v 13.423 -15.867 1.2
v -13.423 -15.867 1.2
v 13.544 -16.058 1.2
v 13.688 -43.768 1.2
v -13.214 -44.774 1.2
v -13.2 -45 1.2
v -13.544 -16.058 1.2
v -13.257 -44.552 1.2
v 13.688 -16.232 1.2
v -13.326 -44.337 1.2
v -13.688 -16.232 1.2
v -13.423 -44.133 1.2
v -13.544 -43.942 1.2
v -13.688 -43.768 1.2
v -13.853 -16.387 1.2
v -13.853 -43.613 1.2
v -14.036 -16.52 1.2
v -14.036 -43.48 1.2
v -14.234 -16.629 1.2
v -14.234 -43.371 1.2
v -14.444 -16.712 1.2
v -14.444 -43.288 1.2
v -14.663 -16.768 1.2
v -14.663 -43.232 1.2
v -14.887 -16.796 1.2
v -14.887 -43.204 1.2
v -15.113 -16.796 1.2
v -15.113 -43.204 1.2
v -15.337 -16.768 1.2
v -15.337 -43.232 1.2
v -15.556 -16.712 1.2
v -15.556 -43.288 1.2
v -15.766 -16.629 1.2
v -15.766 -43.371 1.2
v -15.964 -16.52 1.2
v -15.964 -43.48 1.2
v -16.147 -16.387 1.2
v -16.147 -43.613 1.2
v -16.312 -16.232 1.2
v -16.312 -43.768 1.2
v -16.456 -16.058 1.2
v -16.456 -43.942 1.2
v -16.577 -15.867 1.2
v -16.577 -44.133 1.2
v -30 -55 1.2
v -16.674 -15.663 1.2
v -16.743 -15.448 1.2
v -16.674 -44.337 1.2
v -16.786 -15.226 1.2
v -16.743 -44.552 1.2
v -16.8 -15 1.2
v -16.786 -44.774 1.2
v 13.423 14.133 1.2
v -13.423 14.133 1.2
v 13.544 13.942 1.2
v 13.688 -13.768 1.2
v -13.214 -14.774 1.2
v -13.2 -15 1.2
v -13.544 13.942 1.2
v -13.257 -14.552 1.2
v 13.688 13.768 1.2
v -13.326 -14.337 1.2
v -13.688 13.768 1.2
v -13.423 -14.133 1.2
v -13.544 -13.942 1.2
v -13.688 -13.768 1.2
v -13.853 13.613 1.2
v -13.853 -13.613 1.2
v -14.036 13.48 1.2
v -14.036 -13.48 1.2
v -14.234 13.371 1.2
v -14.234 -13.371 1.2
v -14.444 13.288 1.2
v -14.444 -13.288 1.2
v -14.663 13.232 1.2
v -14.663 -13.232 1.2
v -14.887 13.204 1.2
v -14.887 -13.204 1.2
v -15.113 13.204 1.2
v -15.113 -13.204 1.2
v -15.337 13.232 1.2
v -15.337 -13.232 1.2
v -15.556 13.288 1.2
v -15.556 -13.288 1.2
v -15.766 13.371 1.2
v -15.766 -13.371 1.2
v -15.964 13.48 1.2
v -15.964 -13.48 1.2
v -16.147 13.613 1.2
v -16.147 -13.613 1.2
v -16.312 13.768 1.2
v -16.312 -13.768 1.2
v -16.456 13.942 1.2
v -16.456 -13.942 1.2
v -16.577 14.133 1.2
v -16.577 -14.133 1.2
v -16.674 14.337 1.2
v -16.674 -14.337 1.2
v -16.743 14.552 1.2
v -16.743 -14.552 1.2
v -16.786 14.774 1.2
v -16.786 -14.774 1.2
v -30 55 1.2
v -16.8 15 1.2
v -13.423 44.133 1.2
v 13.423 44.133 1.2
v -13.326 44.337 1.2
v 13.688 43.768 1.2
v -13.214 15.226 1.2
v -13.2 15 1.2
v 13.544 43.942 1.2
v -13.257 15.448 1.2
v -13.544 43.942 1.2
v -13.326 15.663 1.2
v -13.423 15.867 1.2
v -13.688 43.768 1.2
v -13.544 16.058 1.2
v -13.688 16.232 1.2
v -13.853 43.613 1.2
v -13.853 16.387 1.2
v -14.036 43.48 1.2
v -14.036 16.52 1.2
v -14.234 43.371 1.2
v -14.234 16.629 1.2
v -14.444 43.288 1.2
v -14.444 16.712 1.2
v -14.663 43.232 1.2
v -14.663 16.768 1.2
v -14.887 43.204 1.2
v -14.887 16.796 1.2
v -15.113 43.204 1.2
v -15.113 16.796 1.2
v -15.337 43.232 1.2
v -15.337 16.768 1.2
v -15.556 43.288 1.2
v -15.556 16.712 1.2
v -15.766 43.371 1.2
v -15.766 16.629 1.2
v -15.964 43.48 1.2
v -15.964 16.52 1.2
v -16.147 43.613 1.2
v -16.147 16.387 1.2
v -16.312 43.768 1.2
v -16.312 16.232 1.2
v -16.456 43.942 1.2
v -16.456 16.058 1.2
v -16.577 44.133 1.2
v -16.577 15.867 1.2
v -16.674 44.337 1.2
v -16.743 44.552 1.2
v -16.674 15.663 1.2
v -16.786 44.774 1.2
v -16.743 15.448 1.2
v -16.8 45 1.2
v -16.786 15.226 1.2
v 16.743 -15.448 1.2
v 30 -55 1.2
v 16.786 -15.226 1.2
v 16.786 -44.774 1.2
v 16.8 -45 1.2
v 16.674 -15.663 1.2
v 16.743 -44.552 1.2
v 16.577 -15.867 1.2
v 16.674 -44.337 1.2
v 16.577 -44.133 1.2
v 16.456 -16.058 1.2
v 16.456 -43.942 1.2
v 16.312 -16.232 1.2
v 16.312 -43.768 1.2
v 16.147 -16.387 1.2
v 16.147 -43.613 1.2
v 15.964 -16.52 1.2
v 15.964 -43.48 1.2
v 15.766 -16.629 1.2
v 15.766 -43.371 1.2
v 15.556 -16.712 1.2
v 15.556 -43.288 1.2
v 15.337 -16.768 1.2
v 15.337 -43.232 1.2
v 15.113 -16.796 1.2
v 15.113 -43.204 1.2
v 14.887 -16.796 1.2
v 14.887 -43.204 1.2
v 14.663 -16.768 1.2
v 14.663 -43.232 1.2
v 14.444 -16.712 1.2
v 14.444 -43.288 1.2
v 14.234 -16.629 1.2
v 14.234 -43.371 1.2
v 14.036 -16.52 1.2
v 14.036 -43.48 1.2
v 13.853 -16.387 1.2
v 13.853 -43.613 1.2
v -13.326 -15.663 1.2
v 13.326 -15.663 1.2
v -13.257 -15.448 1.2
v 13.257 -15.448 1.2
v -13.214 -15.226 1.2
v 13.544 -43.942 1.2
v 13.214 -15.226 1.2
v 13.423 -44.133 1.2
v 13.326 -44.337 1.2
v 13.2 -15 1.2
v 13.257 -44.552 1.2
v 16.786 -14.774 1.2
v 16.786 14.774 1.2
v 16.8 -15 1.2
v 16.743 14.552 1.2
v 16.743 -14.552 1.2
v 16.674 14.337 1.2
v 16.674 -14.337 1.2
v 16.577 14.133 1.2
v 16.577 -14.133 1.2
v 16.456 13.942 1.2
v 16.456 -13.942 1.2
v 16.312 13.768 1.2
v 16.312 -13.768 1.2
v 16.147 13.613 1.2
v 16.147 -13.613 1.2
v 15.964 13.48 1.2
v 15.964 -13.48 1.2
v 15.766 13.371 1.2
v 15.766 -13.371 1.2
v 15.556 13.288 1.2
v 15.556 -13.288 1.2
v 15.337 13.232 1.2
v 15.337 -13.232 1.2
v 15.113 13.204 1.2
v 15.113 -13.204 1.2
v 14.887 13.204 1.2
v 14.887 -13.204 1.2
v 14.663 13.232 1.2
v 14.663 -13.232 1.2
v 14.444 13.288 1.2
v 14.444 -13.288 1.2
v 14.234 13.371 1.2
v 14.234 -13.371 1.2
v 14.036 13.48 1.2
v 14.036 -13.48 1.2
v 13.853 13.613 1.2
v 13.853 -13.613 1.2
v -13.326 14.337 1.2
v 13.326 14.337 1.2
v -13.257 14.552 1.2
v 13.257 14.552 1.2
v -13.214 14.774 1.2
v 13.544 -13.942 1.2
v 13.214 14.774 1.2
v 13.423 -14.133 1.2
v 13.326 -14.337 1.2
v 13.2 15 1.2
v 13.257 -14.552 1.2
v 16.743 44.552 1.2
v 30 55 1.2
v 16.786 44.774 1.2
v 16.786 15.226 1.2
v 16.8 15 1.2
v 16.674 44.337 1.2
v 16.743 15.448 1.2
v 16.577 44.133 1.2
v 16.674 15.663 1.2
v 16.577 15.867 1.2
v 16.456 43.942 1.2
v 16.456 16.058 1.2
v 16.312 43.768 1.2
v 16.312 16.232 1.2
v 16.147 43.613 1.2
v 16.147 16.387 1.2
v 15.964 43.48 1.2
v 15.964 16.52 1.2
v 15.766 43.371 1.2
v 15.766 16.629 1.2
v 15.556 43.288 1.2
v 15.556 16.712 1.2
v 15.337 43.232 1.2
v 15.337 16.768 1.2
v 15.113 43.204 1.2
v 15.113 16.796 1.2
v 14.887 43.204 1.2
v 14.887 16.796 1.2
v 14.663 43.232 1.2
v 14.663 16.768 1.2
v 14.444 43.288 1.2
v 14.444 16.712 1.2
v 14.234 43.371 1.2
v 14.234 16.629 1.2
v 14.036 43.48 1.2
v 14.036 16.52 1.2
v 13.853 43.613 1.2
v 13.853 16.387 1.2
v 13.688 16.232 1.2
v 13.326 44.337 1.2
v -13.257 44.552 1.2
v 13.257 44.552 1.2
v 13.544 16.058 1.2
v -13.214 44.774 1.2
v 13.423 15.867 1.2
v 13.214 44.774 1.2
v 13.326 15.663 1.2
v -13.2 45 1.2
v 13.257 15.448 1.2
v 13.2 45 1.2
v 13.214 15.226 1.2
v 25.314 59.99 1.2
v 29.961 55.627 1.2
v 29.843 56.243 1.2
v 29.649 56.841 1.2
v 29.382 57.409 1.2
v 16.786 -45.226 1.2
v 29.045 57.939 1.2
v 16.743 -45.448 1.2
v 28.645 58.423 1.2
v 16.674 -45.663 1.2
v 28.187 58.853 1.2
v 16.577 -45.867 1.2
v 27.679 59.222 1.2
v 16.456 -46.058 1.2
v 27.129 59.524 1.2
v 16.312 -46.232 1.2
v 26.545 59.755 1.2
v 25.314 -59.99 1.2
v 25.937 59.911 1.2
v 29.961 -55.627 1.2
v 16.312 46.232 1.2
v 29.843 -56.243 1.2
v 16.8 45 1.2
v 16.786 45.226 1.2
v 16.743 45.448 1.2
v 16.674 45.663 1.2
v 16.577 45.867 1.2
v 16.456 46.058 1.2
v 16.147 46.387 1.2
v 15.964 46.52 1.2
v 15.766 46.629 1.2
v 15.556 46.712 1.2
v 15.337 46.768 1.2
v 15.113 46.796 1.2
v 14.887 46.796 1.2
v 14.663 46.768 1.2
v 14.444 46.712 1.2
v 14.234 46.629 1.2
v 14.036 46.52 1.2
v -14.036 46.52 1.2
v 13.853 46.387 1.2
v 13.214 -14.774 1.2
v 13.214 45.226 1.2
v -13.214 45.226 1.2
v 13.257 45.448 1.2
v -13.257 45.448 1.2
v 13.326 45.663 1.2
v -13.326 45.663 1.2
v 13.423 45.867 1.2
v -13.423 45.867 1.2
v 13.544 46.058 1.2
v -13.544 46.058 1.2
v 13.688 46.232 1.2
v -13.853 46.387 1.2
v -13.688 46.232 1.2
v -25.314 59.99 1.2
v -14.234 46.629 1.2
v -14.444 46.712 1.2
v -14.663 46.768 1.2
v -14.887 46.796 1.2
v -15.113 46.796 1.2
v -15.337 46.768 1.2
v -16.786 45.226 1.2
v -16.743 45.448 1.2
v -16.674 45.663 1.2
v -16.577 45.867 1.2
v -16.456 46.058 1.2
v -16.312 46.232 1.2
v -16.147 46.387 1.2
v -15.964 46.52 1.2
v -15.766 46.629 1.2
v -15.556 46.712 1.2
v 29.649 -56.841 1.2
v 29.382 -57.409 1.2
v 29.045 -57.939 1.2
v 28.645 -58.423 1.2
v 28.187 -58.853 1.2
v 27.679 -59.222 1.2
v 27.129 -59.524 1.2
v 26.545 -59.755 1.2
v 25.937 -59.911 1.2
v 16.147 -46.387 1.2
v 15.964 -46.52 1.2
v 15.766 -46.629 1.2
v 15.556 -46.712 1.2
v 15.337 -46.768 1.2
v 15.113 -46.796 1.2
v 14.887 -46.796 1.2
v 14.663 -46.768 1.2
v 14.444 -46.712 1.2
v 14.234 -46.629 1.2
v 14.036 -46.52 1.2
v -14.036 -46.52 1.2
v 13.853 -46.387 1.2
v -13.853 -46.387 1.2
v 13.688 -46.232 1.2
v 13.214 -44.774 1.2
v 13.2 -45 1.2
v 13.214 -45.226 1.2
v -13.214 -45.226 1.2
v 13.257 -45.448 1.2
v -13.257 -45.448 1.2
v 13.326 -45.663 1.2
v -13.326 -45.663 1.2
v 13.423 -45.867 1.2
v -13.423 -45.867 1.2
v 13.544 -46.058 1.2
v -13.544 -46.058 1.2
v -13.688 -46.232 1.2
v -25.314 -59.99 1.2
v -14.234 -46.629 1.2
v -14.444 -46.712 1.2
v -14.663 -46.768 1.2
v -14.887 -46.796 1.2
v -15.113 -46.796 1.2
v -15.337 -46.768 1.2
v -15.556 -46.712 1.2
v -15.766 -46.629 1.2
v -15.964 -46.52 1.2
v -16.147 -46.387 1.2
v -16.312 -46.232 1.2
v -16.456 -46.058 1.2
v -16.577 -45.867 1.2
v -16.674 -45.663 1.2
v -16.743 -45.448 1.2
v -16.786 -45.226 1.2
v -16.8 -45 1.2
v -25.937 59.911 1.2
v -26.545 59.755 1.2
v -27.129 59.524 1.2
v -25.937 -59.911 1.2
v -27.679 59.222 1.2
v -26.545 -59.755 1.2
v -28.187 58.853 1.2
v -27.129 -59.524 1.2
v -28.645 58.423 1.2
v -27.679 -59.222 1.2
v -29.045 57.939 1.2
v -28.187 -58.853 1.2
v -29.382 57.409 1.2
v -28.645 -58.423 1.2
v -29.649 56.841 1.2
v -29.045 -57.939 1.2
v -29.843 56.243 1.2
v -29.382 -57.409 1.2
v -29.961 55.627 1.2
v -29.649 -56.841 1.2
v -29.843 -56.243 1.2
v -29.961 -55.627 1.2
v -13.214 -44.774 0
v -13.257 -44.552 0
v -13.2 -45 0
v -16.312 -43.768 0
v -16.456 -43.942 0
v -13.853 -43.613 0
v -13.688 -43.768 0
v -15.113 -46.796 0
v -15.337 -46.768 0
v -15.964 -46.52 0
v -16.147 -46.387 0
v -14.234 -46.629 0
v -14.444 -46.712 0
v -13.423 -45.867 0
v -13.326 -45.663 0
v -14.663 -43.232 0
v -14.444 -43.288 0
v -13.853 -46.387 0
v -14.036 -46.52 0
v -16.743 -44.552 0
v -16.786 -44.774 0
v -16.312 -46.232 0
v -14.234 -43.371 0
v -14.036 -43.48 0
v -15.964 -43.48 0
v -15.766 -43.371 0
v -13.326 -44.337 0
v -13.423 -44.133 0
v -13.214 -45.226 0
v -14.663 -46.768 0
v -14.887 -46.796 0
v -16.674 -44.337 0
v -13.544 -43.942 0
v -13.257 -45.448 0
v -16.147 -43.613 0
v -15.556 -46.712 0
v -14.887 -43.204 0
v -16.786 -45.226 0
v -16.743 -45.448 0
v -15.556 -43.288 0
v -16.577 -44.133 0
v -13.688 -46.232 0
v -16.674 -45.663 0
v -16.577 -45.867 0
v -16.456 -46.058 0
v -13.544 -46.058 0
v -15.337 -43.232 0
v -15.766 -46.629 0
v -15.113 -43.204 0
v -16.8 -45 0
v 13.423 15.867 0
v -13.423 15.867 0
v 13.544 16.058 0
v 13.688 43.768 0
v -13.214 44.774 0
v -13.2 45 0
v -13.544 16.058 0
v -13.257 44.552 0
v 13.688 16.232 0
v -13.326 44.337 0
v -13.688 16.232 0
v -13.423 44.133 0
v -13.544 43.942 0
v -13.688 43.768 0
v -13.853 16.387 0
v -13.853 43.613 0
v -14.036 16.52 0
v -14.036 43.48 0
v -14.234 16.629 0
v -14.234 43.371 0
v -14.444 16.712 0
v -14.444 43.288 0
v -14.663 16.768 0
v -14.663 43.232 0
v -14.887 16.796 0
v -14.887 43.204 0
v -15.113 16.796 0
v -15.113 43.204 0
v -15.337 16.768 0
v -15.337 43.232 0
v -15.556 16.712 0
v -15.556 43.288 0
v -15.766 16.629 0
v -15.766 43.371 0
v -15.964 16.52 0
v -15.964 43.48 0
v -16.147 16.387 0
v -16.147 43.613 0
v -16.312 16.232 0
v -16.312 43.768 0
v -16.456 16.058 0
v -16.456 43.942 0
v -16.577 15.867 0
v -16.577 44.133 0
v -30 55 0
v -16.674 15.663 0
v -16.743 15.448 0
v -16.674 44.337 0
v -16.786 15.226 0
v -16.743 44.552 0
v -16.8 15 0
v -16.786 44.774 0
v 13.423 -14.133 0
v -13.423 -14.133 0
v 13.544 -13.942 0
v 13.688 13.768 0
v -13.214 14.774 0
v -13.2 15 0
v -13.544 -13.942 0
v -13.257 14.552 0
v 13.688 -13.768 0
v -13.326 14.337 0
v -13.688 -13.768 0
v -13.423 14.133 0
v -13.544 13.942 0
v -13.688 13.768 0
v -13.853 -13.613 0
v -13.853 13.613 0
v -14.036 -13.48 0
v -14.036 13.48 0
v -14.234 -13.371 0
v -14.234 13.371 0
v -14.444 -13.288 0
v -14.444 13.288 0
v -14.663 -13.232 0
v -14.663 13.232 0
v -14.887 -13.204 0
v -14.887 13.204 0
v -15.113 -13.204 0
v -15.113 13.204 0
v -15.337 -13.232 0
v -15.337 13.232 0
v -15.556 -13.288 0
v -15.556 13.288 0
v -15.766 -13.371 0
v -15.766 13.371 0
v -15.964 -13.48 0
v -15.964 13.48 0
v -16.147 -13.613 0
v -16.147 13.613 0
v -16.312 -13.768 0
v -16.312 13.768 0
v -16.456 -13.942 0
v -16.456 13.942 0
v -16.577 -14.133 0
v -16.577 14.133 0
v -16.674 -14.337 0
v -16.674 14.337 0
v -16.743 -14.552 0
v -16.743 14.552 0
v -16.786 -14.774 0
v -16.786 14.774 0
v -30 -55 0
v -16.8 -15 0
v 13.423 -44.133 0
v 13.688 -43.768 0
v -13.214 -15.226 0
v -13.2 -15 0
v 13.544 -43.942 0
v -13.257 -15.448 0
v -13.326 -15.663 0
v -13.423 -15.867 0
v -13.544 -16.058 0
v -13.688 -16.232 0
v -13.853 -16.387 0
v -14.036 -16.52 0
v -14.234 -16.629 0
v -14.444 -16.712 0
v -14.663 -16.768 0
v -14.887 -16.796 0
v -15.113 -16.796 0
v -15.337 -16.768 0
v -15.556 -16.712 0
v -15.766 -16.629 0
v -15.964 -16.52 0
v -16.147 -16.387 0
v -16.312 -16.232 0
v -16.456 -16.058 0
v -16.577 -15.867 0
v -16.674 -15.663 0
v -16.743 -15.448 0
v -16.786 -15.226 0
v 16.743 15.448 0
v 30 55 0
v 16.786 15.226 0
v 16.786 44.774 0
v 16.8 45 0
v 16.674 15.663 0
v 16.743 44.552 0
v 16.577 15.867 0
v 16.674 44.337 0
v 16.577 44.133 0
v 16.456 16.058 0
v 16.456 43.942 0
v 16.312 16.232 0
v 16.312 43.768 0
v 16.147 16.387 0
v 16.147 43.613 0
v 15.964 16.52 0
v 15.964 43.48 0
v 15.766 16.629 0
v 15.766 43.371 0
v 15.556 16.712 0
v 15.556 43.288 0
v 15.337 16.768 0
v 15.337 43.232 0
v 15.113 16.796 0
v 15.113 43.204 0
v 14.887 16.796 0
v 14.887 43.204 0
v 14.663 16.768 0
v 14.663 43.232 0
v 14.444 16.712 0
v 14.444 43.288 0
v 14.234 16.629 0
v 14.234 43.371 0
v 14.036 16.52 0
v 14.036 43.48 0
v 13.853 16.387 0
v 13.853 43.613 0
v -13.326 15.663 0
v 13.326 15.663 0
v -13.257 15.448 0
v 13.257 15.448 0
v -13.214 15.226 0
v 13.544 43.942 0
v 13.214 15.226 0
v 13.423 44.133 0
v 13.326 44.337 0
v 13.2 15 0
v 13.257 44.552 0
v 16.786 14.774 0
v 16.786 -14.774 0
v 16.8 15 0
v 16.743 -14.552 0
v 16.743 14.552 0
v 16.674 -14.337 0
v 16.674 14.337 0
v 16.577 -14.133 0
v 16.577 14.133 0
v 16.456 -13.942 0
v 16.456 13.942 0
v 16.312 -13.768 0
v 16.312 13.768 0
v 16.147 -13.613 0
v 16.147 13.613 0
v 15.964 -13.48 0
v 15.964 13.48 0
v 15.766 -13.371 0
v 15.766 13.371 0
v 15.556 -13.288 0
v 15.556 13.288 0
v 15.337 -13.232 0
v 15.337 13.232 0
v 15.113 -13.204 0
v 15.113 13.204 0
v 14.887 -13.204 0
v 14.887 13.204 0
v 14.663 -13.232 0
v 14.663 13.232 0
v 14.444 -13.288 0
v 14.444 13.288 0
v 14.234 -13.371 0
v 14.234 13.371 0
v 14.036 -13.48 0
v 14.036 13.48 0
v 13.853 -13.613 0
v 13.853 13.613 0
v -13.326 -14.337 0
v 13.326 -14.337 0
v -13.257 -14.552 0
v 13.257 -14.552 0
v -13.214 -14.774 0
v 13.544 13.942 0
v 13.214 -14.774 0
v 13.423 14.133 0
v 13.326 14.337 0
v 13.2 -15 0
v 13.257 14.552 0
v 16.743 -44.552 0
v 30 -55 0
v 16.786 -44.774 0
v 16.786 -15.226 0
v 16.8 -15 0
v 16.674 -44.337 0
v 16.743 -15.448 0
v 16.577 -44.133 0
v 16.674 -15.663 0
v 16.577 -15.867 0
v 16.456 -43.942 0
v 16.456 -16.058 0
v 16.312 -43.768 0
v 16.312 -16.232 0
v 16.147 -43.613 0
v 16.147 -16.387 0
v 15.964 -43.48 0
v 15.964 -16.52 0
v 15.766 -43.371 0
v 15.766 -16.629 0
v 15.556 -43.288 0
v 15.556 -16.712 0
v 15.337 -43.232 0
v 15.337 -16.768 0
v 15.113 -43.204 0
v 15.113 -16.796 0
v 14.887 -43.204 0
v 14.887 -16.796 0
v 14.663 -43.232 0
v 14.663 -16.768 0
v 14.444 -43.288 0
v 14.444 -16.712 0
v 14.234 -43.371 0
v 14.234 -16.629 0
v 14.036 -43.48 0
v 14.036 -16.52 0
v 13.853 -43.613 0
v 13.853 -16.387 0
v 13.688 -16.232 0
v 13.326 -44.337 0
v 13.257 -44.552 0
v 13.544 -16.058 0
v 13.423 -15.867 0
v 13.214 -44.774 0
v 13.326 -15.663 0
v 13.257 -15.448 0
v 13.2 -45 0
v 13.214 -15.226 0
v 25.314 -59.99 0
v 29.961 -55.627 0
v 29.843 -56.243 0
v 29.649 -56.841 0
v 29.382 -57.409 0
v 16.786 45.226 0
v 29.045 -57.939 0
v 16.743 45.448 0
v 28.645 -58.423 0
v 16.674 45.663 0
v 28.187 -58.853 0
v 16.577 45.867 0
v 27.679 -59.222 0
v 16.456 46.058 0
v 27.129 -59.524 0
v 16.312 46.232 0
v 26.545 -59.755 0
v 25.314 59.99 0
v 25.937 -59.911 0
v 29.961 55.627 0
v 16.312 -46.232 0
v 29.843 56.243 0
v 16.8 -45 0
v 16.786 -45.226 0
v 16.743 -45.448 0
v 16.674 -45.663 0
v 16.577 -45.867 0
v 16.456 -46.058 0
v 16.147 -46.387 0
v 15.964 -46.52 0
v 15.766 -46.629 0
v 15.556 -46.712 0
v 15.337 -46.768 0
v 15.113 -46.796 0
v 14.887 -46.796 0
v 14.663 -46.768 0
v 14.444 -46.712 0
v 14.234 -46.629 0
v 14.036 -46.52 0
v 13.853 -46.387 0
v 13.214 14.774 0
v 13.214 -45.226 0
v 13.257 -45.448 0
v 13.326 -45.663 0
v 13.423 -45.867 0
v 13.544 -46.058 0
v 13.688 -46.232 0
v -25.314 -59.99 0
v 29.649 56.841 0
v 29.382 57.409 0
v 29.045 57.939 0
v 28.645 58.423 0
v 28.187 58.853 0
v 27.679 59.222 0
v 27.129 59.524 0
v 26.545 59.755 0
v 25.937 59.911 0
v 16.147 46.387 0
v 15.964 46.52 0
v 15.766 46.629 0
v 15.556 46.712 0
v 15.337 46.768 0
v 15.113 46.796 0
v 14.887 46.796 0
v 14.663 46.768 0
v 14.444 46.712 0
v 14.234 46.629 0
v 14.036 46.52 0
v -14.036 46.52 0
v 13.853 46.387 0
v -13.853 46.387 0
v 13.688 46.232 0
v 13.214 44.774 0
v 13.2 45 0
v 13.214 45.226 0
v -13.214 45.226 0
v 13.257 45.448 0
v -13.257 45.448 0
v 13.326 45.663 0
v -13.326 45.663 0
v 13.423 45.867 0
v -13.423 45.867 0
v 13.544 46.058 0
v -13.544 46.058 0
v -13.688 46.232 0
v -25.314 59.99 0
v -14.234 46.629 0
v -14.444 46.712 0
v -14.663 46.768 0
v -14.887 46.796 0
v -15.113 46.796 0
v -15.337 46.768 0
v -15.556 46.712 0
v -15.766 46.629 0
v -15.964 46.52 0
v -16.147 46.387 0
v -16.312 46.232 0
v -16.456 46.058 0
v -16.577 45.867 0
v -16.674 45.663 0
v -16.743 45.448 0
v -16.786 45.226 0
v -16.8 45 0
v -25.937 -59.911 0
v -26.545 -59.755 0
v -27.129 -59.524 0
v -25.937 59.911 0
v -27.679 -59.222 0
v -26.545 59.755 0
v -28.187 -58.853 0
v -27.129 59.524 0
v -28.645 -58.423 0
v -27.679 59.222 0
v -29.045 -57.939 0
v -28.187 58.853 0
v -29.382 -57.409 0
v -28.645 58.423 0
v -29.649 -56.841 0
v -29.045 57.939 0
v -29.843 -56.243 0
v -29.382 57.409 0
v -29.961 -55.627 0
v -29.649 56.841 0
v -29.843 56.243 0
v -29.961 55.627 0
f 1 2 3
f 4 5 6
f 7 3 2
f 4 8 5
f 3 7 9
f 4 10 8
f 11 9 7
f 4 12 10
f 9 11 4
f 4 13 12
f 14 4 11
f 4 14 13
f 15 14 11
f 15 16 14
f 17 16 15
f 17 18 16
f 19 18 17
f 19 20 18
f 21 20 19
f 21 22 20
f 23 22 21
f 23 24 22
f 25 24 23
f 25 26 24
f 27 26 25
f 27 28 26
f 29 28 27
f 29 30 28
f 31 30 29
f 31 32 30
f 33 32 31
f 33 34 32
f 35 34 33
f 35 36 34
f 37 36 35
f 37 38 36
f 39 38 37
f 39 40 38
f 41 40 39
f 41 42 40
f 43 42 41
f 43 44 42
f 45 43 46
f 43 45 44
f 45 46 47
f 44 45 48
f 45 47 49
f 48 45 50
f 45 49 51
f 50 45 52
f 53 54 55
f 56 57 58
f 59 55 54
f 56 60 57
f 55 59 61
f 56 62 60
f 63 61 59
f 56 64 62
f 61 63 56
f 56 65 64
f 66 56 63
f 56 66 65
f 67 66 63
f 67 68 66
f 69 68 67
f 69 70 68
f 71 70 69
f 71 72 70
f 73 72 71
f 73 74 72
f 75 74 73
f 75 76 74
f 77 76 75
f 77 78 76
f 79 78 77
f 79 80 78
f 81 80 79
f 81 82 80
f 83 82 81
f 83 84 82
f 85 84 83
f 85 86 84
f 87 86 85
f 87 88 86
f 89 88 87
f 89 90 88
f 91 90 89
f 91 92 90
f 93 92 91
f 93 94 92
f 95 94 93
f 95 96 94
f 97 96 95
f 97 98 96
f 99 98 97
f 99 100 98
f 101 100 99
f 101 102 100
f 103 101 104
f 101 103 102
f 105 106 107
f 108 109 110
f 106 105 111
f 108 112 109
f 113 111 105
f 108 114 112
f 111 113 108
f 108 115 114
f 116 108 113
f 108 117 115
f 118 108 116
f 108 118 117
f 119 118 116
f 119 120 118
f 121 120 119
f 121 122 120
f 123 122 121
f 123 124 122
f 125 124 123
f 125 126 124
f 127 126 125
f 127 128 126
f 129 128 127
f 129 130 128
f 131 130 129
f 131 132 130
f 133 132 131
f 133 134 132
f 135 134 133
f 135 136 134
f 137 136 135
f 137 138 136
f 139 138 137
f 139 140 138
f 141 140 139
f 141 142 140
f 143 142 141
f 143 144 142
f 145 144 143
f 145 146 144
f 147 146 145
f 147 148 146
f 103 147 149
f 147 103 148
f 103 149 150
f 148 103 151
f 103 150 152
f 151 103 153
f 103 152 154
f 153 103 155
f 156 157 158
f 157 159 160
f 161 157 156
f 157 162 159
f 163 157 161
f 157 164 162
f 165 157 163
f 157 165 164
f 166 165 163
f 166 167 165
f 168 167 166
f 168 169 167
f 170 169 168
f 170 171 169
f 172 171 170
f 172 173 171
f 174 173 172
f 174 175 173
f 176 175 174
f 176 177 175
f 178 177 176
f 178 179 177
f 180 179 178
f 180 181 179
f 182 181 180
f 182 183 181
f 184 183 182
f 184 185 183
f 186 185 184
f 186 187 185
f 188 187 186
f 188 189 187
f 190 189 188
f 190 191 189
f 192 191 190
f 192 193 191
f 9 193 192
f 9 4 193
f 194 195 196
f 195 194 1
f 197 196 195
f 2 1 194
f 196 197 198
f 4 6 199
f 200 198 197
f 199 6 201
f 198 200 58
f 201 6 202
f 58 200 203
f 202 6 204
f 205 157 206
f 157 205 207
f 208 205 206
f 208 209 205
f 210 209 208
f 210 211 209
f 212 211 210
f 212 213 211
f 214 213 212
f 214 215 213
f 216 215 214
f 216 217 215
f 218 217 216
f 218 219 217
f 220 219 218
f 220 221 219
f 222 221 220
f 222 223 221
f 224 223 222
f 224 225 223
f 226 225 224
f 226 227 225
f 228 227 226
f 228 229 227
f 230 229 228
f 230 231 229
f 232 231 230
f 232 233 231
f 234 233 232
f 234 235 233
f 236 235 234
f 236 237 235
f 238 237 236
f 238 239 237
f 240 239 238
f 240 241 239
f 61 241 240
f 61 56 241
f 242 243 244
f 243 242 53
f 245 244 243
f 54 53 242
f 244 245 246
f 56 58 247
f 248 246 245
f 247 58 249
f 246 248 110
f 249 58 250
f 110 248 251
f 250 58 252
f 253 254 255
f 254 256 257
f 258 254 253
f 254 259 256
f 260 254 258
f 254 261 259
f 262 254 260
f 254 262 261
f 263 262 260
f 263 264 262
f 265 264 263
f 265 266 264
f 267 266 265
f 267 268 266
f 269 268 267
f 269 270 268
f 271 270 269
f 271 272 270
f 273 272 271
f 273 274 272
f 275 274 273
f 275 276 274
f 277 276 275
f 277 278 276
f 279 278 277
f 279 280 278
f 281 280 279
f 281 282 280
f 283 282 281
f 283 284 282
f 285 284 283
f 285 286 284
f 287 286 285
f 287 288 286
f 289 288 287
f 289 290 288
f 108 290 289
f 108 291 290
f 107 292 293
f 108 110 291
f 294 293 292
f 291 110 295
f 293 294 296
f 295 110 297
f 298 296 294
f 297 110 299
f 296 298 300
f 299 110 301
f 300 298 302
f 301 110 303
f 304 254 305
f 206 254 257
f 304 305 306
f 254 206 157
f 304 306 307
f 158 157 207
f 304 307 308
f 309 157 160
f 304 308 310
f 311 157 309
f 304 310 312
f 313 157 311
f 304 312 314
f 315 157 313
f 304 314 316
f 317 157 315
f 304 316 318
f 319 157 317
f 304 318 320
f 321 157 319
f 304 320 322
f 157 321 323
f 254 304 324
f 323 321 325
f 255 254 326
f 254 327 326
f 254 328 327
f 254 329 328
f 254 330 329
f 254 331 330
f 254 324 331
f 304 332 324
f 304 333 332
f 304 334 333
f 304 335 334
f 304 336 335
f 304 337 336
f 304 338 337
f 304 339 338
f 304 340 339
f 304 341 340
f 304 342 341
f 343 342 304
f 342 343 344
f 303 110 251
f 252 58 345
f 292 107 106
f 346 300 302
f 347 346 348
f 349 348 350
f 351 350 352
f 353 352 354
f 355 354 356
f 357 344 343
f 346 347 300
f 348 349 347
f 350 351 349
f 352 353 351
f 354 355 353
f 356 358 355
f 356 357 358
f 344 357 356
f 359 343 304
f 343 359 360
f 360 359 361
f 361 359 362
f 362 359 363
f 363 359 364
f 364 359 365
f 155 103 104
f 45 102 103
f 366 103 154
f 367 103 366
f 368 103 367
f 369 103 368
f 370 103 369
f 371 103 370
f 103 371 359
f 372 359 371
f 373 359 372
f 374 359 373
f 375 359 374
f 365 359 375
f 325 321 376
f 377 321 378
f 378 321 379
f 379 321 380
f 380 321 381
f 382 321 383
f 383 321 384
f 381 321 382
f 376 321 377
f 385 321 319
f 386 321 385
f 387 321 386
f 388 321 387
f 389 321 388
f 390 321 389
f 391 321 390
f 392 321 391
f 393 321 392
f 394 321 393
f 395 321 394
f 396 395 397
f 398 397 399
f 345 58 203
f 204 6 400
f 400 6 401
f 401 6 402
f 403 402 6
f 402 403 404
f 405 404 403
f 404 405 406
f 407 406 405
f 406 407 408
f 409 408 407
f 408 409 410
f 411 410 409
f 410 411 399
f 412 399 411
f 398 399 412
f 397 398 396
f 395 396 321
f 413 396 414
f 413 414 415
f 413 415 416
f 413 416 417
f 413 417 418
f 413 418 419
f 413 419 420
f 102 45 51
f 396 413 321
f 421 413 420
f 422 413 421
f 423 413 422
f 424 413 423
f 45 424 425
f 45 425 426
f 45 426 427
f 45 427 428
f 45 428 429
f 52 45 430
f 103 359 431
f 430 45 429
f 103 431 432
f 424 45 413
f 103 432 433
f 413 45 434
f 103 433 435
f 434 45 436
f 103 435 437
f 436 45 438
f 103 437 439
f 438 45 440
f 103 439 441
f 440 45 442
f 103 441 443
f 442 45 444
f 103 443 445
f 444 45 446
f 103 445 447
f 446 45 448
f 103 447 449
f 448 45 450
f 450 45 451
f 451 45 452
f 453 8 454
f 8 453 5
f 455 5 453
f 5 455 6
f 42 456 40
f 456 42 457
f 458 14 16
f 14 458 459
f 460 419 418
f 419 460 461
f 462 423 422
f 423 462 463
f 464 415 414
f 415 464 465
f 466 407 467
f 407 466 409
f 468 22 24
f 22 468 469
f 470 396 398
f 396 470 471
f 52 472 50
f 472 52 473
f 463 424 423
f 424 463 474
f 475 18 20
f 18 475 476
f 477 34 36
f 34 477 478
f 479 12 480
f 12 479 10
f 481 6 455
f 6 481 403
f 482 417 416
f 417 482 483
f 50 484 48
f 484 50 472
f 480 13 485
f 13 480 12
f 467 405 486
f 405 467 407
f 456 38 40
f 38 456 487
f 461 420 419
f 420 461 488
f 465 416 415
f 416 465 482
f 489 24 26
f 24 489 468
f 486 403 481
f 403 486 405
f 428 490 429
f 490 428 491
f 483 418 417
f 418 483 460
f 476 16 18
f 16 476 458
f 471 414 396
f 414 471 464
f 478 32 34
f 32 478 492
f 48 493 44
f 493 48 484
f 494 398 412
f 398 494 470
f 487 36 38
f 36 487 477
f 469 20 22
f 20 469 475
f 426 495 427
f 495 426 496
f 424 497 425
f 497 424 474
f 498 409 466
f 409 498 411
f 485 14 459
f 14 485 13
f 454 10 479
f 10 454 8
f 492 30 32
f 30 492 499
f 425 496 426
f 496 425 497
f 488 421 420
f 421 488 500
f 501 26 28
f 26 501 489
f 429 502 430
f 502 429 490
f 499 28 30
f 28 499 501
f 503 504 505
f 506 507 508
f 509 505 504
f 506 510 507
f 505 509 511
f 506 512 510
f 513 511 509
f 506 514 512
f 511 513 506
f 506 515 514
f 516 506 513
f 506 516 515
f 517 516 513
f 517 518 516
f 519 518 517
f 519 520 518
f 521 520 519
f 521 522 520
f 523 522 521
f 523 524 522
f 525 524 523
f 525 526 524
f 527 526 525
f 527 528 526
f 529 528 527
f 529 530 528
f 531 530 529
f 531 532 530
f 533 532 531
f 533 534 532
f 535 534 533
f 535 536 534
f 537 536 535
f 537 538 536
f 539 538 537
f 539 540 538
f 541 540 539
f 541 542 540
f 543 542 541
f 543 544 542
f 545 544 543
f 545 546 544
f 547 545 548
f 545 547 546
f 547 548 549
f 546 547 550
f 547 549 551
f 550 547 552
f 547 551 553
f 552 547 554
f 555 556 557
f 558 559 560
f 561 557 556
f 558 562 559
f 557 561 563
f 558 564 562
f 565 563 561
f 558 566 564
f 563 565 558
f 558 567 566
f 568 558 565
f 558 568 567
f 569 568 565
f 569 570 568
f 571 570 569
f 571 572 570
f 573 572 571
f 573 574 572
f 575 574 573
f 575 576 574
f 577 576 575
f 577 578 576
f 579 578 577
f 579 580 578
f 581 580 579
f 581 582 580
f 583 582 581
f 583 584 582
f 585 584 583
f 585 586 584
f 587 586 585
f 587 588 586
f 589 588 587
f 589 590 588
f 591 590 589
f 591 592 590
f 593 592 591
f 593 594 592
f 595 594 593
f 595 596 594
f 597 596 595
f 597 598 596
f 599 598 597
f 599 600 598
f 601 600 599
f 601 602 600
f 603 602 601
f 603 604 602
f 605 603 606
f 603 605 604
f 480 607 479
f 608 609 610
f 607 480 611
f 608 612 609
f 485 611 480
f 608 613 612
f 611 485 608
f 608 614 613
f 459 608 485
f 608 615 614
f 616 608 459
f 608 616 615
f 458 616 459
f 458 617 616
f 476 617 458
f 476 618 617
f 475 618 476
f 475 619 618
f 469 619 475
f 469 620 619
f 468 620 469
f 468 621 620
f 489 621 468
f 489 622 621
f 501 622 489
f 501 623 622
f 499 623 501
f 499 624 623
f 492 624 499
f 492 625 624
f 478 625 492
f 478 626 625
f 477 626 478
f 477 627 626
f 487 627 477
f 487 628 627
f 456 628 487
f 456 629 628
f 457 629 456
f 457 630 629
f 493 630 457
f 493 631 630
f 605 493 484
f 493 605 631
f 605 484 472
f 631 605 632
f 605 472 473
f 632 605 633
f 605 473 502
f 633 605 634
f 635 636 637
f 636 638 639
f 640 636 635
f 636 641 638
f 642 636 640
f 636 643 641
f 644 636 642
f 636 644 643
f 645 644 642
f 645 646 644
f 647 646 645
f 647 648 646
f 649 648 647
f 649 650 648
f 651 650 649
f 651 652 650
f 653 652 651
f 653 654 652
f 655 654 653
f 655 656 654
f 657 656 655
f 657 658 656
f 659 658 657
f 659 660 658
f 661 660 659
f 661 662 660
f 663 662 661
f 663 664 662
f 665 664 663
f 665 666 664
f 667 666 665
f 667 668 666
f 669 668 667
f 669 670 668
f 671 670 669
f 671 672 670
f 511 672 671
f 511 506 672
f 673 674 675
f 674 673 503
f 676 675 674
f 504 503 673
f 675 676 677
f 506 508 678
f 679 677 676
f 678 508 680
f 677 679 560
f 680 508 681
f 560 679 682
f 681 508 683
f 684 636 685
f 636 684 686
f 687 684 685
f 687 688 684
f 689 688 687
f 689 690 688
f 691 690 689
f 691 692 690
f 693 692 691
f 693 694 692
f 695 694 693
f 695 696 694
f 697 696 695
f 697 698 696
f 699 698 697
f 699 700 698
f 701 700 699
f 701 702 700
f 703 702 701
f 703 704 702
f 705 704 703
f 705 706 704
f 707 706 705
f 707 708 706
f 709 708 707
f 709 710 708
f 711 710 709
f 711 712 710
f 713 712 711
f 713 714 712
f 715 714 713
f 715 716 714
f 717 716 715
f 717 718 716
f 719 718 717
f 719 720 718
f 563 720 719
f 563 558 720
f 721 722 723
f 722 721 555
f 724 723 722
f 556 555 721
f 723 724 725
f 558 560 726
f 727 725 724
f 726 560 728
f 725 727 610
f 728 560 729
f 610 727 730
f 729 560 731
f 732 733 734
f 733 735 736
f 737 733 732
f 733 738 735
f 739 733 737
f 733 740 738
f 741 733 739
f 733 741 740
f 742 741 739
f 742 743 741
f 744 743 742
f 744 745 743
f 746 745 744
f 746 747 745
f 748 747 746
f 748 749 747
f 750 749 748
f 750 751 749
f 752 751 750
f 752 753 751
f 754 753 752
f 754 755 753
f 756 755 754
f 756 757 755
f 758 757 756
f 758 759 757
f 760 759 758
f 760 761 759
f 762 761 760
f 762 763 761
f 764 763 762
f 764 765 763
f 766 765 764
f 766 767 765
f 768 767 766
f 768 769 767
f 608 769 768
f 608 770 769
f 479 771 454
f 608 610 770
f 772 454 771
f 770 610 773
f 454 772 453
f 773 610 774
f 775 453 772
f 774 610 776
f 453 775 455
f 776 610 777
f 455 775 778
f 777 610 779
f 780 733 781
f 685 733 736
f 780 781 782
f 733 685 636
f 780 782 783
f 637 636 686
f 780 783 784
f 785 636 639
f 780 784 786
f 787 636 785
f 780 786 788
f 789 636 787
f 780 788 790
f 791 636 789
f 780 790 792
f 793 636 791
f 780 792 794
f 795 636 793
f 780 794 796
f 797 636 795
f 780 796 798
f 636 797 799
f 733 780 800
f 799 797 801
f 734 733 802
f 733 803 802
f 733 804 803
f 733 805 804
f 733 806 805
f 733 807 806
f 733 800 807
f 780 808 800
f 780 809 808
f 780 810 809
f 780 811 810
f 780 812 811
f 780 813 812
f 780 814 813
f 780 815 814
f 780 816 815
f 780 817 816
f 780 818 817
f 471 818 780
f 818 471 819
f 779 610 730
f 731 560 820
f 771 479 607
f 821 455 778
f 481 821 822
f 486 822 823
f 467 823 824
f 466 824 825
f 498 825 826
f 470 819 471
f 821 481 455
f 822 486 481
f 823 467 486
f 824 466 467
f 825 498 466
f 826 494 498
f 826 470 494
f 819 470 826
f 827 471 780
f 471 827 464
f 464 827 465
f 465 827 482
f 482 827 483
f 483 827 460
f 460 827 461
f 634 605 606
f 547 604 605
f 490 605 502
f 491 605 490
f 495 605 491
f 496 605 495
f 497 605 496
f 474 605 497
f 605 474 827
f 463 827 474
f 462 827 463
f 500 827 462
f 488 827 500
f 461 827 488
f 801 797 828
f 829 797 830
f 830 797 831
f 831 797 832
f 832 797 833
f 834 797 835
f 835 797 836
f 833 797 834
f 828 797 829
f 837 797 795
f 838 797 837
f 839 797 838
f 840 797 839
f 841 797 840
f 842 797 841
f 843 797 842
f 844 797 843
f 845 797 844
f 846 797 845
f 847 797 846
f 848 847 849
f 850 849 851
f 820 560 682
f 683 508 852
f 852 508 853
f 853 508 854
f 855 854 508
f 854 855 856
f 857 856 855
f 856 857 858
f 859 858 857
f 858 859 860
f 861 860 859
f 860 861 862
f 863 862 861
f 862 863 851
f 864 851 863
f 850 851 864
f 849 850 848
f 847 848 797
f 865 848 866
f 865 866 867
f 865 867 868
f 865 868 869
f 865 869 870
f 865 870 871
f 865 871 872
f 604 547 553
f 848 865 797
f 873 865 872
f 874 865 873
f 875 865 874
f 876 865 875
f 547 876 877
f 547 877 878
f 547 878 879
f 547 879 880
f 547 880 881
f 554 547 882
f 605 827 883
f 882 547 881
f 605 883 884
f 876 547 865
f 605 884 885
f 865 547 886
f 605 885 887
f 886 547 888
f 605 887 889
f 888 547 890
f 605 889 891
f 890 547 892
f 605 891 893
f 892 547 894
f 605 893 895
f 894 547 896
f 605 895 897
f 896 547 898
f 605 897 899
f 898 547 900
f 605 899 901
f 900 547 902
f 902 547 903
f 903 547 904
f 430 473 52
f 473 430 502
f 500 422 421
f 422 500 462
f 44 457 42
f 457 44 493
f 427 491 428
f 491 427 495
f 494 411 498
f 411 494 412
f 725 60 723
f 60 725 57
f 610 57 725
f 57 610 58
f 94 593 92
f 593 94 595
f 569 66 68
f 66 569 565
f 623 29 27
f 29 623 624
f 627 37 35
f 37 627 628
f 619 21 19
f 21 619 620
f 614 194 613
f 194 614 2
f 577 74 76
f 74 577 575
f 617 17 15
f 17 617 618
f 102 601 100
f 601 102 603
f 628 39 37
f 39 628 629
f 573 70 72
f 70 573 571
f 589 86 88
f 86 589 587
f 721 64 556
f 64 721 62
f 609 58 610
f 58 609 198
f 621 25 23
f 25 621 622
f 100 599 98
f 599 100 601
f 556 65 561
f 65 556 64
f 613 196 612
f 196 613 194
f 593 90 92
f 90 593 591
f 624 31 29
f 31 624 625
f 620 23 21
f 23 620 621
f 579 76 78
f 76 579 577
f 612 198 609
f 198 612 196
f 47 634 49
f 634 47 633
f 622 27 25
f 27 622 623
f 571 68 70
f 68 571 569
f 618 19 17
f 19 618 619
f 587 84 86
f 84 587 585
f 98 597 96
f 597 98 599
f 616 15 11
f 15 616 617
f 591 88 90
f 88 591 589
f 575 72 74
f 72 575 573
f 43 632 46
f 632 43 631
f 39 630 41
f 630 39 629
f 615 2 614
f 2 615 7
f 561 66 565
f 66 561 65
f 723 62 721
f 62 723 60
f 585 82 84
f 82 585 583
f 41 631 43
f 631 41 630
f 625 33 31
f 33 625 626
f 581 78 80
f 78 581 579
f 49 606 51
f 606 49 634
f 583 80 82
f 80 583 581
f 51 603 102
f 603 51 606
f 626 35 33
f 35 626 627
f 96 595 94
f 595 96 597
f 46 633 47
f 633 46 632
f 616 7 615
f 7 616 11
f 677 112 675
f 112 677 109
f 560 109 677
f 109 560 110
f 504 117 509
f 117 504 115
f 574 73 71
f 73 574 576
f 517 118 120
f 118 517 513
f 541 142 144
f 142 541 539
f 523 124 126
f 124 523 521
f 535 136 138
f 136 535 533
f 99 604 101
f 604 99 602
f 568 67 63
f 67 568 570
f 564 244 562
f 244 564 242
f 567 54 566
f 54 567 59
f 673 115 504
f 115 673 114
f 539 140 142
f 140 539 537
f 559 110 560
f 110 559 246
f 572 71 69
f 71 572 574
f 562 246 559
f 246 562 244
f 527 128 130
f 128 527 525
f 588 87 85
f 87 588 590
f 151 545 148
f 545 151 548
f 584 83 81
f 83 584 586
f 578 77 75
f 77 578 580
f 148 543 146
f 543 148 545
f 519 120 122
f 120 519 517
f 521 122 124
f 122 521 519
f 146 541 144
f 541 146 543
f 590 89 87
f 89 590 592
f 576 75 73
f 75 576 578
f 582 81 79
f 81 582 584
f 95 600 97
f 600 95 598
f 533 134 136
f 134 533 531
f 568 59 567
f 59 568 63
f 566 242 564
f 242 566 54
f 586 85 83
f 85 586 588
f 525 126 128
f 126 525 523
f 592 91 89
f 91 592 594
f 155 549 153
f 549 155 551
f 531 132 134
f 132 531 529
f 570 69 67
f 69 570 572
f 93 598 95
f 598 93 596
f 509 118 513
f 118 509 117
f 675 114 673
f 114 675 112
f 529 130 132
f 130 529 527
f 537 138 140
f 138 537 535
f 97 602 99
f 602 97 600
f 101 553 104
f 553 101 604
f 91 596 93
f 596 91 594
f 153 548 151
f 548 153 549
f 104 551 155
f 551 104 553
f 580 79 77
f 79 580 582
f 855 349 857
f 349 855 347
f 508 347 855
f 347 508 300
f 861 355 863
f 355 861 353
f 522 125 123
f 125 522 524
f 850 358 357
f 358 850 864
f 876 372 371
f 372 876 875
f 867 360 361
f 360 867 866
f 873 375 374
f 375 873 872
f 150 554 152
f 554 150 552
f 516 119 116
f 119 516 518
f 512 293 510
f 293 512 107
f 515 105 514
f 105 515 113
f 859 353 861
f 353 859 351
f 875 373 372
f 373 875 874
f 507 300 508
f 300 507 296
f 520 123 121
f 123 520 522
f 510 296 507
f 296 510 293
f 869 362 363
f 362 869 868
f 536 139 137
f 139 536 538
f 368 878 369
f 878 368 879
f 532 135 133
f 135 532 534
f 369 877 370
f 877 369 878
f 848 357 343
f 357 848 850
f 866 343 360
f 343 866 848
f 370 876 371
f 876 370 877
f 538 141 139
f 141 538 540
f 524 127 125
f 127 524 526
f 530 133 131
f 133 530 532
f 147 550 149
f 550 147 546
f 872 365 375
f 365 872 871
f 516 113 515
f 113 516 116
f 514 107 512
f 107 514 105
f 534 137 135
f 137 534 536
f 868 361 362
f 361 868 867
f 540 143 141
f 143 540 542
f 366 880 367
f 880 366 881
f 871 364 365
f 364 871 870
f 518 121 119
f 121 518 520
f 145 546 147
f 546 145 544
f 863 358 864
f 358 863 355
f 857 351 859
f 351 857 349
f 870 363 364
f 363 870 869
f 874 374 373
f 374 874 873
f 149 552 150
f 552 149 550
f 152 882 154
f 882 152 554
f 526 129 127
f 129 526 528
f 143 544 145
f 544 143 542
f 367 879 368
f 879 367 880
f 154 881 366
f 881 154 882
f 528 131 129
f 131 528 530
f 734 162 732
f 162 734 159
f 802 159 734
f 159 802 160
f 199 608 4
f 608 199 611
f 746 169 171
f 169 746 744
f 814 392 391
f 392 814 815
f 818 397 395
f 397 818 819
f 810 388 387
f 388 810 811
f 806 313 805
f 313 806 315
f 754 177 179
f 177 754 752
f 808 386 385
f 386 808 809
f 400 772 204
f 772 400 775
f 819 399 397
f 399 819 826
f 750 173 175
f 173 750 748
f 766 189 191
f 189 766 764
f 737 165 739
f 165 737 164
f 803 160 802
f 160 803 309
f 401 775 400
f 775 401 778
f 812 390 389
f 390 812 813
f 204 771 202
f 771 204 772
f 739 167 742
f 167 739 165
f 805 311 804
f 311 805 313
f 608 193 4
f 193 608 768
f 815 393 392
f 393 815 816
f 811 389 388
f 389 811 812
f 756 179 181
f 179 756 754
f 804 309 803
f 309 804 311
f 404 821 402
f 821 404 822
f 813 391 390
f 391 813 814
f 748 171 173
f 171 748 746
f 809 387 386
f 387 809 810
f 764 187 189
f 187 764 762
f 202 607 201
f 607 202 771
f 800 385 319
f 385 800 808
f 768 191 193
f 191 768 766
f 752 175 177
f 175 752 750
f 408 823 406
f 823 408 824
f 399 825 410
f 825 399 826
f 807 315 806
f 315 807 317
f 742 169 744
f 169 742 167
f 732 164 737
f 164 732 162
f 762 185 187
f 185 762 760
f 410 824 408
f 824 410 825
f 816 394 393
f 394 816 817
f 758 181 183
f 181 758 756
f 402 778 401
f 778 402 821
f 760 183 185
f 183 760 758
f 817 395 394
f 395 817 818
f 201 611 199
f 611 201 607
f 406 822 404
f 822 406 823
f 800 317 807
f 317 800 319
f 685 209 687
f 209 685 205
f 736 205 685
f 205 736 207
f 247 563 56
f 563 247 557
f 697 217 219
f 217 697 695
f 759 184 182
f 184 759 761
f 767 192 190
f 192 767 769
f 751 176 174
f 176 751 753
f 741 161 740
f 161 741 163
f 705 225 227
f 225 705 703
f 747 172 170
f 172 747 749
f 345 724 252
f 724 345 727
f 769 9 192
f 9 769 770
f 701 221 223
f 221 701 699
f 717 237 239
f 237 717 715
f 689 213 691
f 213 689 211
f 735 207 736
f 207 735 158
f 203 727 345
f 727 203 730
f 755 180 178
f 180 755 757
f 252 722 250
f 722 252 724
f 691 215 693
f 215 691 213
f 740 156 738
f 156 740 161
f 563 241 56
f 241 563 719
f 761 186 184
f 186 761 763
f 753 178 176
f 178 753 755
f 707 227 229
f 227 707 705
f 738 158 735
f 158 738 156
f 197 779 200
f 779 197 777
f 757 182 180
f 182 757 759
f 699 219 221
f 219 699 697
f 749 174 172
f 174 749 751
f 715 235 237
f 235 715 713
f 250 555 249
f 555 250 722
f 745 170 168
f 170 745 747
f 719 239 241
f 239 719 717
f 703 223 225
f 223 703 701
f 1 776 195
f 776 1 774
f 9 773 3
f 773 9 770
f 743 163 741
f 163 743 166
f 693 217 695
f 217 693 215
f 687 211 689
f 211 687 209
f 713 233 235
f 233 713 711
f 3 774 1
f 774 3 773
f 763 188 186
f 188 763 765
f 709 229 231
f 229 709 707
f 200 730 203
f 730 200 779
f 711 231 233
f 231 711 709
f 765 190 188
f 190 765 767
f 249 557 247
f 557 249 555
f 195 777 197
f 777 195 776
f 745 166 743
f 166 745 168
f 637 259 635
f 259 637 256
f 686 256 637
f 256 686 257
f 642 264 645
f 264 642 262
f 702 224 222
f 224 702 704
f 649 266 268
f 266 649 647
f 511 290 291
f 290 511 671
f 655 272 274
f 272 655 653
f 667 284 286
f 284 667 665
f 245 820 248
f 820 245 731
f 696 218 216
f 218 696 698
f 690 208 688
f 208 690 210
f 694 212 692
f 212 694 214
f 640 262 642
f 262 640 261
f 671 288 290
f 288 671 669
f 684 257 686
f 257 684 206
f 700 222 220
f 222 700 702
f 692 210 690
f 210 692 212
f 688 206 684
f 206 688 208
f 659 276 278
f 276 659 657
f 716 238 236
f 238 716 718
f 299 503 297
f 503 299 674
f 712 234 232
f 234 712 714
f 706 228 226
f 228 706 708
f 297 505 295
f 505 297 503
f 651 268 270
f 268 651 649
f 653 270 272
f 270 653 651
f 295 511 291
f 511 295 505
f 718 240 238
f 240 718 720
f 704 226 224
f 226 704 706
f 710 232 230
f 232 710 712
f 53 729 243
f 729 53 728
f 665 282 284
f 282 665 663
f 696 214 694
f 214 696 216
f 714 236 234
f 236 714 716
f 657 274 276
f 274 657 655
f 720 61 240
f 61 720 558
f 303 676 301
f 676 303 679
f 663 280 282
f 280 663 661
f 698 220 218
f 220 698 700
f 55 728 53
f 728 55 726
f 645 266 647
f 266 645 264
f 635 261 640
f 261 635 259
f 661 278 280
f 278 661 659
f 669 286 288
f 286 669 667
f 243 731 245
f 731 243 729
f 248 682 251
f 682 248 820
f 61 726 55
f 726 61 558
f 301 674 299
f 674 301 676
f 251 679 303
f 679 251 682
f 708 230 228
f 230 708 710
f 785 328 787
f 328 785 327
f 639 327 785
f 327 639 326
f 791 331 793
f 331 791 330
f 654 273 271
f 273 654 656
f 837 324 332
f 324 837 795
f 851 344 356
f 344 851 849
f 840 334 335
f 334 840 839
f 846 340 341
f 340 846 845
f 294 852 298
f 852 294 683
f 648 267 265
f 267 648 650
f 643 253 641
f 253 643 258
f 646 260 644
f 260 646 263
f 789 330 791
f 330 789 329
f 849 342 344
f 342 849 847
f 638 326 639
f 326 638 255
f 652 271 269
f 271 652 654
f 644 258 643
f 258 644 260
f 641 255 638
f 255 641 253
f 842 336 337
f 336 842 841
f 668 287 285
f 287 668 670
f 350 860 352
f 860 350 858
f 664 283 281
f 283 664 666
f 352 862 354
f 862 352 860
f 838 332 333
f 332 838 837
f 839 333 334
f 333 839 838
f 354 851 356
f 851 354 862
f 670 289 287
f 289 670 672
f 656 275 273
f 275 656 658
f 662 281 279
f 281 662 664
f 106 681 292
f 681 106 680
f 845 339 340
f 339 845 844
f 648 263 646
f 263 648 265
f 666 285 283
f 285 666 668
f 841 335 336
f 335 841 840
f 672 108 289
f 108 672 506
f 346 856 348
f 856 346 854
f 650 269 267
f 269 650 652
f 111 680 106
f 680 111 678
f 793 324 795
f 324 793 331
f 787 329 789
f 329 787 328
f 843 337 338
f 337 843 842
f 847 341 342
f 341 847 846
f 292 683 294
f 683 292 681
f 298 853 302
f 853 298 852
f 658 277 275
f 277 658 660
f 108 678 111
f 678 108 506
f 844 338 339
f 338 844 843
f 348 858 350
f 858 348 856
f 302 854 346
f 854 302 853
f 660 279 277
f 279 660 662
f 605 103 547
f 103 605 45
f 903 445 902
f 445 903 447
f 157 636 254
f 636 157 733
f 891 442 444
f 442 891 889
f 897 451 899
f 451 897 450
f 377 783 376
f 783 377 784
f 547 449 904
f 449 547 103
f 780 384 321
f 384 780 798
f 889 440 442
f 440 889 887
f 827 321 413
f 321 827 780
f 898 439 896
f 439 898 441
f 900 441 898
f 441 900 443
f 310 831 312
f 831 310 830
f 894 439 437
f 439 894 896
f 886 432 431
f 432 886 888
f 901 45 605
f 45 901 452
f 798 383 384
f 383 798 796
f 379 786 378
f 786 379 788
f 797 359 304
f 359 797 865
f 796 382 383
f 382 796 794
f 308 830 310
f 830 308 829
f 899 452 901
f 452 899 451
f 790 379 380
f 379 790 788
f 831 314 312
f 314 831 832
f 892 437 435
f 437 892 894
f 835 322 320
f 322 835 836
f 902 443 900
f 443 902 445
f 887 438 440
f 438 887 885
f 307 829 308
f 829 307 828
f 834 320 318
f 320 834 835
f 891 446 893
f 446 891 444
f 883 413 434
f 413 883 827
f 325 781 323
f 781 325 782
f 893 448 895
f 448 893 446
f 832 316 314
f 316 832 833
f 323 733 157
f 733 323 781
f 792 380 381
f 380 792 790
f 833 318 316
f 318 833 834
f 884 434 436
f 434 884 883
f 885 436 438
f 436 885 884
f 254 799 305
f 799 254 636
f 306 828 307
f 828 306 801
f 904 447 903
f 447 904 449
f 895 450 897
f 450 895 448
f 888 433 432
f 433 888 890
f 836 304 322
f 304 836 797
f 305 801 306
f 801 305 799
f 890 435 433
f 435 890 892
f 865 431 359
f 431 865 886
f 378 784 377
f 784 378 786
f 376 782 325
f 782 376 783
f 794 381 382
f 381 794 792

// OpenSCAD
$fn = 50;


difference() {
	union() {
		hull() {
			translate(v = [-25.0000000000, 55.0000000000, 0]) {
				cylinder(h = 90, r = 5);
			}
			translate(v = [25.0000000000, 55.0000000000, 0]) {
				cylinder(h = 90, r = 5);
			}
			translate(v = [-25.0000000000, -55.0000000000, 0]) {
				cylinder(h = 90, r = 5);
			}
			translate(v = [25.0000000000, -55.0000000000, 0]) {
				cylinder(h = 90, r = 5);
			}
		}
	}
	union() {
		translate(v = [0, 0, 1.2000000000]) {
			hull() {
				translate(v = [-25.0000000000, 55.0000000000, 0]) {
					cylinder(h = 88.8000000000, r = 3.8000000000);
				}
				translate(v = [25.0000000000, 55.0000000000, 0]) {
					cylinder(h = 88.8000000000, r = 3.8000000000);
				}
				translate(v = [-25.0000000000, -55.0000000000, 0]) {
					cylinder(h = 88.8000000000, r = 3.8000000000);
				}
				translate(v = [25.0000000000, -55.0000000000, 0]) {
					cylinder(h = 88.8000000000, r = 3.8000000000);
				}
			}
		}
		#translate(v = [-15.0000000000, -45.0000000000, 0]) {
			cylinder(h = 1.2000000000, r = 1.8000000000);
		}
		#translate(v = [-15.0000000000, -15.0000000000, 0]) {
			cylinder(h = 1.2000000000, r = 1.8000000000);
		}
		#translate(v = [-15.0000000000, 15.0000000000, 0]) {
			cylinder(h = 1.2000000000, r = 1.8000000000);
		}
		#translate(v = [-15.0000000000, 45.0000000000, 0]) {
			cylinder(h = 1.2000000000, r = 1.8000000000);
		}
		#translate(v = [15.0000000000, -45.0000000000, 0]) {
			cylinder(h = 1.2000000000, r = 1.8000000000);
		}
		#translate(v = [15.0000000000, -15.0000000000, 0]) {
			cylinder(h = 1.2000000000, r = 1.8000000000);
		}
		#translate(v = [15.0000000000, 15.0000000000, 0]) {
			cylinder(h = 1.2000000000, r = 1.8000000000);
		}
		#translate(v = [15.0000000000, 45.0000000000, 0]) {
			cylinder(h = 1.2000000000, r = 1.8000000000);
		}
		translate(v = [-250.0000000000, -250.0000000000, 1.2000000000]) {
			cube(size = [500, 500, 500]);
		}
		translate(v = [-250.0000000000, -250.0000000000, 1.2000000000]) {
			cube(size = [500, 500, 500]);
		}
		translate(v = [-250.0000000000, -250.0000000000, 1.2000000000]) {
			cube(size = [500, 500, 500]);
		}
	}
}
